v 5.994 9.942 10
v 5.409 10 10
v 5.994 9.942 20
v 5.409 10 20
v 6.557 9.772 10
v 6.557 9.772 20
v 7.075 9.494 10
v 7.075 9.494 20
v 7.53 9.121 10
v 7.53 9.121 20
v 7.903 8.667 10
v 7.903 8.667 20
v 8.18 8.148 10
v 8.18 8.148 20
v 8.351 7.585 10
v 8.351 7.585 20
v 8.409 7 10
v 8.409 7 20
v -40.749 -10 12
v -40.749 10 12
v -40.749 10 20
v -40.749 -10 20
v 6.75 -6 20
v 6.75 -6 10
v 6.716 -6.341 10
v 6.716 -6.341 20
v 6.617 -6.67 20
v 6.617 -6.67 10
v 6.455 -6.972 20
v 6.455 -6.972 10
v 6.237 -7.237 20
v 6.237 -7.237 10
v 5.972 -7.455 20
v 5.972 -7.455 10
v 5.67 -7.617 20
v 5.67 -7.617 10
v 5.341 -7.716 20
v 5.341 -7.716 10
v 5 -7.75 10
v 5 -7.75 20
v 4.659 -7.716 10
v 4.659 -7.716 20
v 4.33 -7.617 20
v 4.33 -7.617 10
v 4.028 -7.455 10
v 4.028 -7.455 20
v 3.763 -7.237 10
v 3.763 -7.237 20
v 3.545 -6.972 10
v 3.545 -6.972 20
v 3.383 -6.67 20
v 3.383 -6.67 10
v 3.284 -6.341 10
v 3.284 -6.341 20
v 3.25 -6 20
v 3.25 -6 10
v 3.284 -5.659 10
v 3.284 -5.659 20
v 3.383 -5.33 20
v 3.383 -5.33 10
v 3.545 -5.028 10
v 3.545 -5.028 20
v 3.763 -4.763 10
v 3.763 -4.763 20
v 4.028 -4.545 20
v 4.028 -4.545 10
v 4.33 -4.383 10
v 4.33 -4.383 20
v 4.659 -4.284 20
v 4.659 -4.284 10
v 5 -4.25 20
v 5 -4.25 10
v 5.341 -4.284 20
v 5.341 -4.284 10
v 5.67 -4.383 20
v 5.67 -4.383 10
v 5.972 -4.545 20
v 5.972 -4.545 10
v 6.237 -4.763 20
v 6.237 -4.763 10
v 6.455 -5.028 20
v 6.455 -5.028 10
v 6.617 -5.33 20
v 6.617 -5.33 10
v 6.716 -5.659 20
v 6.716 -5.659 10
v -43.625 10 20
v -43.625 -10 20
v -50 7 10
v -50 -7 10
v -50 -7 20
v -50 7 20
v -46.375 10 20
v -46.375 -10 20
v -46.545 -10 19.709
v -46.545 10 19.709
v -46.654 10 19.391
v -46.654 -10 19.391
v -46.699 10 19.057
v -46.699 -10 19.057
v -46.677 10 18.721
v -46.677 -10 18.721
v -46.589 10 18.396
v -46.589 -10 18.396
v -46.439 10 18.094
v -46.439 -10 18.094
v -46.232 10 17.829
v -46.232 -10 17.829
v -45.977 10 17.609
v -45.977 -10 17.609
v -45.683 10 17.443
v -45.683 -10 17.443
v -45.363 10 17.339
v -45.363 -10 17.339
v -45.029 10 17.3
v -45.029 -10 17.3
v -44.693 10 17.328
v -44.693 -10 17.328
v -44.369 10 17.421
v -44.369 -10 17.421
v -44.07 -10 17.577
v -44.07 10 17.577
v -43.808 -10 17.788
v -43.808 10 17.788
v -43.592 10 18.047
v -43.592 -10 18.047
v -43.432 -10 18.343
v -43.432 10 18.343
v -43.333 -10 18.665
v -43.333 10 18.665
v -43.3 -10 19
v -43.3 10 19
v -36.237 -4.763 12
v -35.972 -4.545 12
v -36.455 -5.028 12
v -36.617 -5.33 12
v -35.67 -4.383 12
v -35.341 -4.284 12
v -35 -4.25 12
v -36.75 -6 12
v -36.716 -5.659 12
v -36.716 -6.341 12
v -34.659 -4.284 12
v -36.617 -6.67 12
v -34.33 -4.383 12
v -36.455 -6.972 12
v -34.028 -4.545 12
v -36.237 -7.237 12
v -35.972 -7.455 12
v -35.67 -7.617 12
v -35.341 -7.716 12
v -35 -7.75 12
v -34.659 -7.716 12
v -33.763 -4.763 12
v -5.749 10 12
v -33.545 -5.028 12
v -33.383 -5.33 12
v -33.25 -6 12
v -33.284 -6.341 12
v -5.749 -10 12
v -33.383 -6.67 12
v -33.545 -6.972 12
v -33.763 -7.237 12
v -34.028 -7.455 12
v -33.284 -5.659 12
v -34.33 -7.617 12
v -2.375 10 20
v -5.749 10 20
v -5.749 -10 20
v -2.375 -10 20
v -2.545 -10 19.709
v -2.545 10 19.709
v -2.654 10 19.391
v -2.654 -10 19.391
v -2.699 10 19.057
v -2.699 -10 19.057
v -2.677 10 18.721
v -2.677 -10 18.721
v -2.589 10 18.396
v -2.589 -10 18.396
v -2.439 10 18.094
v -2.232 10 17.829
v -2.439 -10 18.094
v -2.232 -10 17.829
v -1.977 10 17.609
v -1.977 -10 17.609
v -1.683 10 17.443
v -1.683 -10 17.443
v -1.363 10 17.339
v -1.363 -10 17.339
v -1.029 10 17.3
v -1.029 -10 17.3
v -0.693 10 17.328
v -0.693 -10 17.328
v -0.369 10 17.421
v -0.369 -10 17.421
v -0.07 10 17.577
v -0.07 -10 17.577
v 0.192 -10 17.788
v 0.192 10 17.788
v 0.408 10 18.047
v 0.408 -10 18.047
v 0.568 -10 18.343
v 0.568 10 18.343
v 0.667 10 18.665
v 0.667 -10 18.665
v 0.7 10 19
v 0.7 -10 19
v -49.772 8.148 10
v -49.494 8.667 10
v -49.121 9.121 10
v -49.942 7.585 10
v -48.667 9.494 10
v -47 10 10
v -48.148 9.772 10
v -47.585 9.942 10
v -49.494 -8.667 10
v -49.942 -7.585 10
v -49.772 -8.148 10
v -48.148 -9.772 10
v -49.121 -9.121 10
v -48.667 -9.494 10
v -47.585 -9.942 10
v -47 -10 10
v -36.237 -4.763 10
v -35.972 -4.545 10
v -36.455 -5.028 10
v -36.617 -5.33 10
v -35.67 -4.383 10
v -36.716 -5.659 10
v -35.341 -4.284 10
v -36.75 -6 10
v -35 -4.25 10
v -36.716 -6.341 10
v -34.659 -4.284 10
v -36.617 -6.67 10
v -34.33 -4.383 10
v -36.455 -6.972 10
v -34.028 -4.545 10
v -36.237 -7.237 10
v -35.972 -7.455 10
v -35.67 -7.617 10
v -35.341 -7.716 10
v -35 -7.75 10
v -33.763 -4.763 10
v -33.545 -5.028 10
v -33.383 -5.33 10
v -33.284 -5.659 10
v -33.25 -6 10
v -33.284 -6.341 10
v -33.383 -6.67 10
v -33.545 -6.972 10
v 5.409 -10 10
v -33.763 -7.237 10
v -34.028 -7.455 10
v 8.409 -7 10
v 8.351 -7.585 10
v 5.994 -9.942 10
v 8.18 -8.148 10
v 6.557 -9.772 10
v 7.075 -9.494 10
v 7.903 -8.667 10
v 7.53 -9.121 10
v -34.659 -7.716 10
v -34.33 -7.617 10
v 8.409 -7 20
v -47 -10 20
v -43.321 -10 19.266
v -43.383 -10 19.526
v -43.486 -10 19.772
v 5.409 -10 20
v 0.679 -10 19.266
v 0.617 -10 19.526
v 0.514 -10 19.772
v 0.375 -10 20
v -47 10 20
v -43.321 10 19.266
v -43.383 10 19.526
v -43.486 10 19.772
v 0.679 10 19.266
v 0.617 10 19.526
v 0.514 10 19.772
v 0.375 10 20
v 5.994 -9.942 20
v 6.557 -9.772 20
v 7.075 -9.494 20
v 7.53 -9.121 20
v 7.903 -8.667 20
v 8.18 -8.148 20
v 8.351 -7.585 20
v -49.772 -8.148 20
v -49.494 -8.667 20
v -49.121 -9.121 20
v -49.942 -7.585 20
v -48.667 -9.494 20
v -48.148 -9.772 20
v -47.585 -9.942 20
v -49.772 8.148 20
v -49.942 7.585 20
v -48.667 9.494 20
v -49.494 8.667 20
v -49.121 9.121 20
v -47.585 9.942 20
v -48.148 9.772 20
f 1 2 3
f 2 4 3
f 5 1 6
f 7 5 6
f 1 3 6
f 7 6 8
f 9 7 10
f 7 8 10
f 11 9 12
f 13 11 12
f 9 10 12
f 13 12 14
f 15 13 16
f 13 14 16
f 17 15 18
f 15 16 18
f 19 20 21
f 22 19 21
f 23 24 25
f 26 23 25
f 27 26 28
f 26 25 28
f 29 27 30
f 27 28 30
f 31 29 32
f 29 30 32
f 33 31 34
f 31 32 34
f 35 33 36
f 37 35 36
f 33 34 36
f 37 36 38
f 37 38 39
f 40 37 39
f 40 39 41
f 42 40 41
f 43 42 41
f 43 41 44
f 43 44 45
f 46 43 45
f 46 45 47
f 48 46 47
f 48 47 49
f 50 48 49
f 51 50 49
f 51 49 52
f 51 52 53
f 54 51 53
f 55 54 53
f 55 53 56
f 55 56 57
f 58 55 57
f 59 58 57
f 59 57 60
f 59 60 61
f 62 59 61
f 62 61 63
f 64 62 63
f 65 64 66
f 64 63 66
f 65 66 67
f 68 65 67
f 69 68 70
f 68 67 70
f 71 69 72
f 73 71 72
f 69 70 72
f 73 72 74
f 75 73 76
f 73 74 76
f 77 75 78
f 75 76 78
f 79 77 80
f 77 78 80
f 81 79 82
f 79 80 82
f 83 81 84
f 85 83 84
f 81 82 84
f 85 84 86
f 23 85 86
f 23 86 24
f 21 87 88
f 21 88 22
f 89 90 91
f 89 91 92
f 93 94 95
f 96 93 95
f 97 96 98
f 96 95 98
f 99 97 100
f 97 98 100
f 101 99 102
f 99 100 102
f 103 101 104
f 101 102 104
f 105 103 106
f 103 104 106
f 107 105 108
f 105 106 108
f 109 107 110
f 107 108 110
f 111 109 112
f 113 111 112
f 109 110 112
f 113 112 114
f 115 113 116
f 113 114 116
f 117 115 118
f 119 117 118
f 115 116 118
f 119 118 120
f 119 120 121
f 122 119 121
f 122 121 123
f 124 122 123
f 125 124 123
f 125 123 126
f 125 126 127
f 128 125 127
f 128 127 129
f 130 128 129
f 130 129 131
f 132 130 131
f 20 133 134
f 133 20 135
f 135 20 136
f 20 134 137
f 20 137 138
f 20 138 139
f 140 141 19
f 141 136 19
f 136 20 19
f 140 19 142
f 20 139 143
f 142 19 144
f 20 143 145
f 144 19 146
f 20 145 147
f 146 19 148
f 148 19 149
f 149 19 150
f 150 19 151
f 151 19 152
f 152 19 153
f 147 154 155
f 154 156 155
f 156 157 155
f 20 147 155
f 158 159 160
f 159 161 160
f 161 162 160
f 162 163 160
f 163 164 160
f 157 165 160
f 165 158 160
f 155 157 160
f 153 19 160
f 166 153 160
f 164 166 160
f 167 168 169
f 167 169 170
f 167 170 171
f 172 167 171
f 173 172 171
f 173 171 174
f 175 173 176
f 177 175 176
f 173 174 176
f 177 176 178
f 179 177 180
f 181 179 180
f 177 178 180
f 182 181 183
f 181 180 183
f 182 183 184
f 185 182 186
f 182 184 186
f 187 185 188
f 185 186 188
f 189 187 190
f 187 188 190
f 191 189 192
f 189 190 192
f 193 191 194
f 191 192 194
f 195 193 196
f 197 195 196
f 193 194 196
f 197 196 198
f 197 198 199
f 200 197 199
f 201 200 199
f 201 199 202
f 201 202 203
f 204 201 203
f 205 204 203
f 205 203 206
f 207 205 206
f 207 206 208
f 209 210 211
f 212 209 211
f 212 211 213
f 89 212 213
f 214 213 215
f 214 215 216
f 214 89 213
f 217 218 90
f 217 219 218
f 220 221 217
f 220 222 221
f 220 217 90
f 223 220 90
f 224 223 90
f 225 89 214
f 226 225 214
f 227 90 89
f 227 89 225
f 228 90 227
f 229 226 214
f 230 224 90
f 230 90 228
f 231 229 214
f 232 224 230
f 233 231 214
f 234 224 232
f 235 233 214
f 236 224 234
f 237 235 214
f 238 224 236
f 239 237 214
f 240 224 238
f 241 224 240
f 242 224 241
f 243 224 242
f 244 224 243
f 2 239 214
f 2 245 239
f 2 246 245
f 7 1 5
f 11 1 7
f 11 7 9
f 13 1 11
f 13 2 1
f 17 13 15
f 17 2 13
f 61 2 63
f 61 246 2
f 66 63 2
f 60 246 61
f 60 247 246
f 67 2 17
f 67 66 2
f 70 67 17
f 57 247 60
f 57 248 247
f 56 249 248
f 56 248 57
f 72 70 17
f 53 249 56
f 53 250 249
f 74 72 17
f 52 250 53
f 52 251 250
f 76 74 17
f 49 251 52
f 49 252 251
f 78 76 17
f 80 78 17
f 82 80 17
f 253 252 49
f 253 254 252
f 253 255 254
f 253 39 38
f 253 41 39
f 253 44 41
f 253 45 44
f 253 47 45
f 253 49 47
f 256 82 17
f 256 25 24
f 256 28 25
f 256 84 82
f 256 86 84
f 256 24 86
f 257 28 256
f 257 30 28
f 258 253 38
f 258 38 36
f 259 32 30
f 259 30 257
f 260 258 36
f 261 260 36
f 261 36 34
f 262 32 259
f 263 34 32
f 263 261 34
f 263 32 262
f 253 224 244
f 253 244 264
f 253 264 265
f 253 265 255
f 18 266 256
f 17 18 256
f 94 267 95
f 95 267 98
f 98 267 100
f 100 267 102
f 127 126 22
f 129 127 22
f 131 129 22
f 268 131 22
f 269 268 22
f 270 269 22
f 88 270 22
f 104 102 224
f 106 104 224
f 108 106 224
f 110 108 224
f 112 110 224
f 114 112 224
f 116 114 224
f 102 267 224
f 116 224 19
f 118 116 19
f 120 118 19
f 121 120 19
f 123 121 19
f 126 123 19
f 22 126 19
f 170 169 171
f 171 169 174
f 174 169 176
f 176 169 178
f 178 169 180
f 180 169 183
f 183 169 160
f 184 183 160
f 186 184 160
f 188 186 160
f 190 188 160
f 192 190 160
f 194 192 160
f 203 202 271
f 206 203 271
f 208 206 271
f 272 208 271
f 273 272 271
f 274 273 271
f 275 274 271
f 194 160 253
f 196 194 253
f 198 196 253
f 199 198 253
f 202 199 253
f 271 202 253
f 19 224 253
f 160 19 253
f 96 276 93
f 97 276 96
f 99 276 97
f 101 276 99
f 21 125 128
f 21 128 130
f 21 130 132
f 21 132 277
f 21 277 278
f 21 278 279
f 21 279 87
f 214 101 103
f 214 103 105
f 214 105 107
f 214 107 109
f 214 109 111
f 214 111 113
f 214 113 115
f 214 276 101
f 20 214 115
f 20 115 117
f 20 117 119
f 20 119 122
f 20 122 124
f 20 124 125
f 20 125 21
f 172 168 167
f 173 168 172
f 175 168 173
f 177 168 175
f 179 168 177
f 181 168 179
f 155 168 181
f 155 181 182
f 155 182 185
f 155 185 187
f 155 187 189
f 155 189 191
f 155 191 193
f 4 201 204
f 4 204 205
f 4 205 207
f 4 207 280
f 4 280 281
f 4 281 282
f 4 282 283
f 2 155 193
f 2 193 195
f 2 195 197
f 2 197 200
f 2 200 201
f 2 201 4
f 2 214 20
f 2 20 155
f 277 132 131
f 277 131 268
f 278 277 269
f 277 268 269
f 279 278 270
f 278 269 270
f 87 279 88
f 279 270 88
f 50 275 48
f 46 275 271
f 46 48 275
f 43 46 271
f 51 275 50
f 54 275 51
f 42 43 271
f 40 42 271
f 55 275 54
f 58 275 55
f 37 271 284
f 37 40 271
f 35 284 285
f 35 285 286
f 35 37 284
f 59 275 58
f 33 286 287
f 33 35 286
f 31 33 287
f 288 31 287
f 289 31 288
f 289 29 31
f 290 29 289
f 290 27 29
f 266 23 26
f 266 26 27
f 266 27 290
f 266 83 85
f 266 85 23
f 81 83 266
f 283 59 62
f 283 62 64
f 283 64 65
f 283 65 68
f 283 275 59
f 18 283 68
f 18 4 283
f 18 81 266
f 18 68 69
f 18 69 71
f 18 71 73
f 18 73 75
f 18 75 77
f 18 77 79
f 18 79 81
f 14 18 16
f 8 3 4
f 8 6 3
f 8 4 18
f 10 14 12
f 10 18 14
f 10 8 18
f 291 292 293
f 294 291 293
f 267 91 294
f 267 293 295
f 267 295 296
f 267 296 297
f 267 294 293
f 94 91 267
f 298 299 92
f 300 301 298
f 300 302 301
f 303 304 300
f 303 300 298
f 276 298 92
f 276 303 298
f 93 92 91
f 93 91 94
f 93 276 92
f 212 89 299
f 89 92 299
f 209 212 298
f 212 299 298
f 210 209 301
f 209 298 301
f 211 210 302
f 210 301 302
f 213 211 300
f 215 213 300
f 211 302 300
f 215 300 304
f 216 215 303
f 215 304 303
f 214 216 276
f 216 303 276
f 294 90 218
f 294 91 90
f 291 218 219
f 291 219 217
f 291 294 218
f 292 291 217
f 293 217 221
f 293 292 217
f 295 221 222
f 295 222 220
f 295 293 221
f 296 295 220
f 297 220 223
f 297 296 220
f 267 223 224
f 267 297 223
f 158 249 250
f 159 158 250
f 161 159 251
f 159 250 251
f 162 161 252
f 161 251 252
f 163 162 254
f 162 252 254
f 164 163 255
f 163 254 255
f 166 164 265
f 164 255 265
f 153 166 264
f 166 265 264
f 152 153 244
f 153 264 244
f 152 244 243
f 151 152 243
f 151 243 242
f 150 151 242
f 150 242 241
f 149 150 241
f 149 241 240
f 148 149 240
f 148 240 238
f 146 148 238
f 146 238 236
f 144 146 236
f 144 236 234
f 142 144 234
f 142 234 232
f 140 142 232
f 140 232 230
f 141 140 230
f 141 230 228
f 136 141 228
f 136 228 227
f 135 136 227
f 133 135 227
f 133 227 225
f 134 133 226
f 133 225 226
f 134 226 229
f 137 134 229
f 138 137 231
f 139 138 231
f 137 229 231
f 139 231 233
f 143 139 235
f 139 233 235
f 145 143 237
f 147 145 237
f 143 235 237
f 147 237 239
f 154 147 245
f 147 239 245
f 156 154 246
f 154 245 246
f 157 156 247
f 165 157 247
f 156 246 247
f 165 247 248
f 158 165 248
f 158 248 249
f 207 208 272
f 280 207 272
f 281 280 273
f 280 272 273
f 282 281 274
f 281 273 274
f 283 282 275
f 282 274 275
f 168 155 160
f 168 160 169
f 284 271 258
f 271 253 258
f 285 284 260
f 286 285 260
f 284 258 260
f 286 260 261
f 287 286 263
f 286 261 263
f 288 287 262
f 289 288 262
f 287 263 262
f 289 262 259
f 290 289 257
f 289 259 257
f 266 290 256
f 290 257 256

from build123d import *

# Parameters (mm, degrees)
F0_W     = 100
F0_H     = 20
F1_DEPTH = 20
F3_DEPTH = 25
F4_W     = 58.4087243304
F4_H     = 10
F4_W_2   = 35
F4_H_2   = 8
F5_DEPTH = 25
F6_R     = 1.75
F7_DEPTH = 25
F8_R     = 3


with BuildPart() as f1:
    # F0 (on Top) → F1 (new body)
    with BuildSketch(Plane.XY):
        Rectangle(F0_W, F0_H)
    extrude(amount=F1_DEPTH)

    # F2 (on face) → F3 (cut)
    with BuildSketch(Plane.XZ.offset(10)):
        with BuildLine():
            ThreePointArc((-46.3747727085, 20), (-45.5257786585, 17.38335013), (-43.3, 19))
            ThreePointArc((-43.3, 19), (-43.38335013, 19.5257786585), (-43.6252272915, 20))
            Line((-43.6252272915, 20), (-46.3747727085, 20))
        make_face()
        with BuildLine():
            Line((0.3747727085, 20), (-2.3747727085, 20))
            ThreePointArc((-2.3747727085, 20), (-1.5257786585, 17.38335013), (0.7, 19))
            ThreePointArc((0.7, 19), (0.61664987, 19.5257786585), (0.3747727085, 20))
        make_face()
    extrude(amount=-F3_DEPTH, mode=Mode.SUBTRACT)

    # F4 (on face) → F5 (cut)
    with BuildSketch(Plane.XZ.offset(10)):
        Polygon((50, 20), (8.4087243304, 20), (8.4087243304, 10), (8.4087243304, 0), (50, 0), align=None)
        with Locations((-20.7956378348, 5)):
            Rectangle(F4_W, F4_H)
        with Locations((-23.2489995997, 16)):
            Rectangle(F4_W_2, F4_H_2)
    extrude(amount=-F5_DEPTH, mode=Mode.SUBTRACT)

    # F6 (on face) → F7 (cut)
    with BuildSketch(Plane(origin=(0, 0, 10), x_dir=(1, 0, 0), z_dir=(0, 0, -1))):
        with Locations((-35, 6)):
            Circle(F6_R)
        with Locations((5, 6)):
            Circle(F6_R)
    extrude(amount=-F7_DEPTH, mode=Mode.SUBTRACT)

    # F8
    f8_edges = [f1.edges().sort_by_distance(p)[0] for p in [
        (-50, -10, 15),
        (-50, 10, 15),
        (8.408724, 10, 15),
        (8.408724, -10, 15),
    ]]
    fillet(f8_edges, radius=F8_R)


solid = f1.part
